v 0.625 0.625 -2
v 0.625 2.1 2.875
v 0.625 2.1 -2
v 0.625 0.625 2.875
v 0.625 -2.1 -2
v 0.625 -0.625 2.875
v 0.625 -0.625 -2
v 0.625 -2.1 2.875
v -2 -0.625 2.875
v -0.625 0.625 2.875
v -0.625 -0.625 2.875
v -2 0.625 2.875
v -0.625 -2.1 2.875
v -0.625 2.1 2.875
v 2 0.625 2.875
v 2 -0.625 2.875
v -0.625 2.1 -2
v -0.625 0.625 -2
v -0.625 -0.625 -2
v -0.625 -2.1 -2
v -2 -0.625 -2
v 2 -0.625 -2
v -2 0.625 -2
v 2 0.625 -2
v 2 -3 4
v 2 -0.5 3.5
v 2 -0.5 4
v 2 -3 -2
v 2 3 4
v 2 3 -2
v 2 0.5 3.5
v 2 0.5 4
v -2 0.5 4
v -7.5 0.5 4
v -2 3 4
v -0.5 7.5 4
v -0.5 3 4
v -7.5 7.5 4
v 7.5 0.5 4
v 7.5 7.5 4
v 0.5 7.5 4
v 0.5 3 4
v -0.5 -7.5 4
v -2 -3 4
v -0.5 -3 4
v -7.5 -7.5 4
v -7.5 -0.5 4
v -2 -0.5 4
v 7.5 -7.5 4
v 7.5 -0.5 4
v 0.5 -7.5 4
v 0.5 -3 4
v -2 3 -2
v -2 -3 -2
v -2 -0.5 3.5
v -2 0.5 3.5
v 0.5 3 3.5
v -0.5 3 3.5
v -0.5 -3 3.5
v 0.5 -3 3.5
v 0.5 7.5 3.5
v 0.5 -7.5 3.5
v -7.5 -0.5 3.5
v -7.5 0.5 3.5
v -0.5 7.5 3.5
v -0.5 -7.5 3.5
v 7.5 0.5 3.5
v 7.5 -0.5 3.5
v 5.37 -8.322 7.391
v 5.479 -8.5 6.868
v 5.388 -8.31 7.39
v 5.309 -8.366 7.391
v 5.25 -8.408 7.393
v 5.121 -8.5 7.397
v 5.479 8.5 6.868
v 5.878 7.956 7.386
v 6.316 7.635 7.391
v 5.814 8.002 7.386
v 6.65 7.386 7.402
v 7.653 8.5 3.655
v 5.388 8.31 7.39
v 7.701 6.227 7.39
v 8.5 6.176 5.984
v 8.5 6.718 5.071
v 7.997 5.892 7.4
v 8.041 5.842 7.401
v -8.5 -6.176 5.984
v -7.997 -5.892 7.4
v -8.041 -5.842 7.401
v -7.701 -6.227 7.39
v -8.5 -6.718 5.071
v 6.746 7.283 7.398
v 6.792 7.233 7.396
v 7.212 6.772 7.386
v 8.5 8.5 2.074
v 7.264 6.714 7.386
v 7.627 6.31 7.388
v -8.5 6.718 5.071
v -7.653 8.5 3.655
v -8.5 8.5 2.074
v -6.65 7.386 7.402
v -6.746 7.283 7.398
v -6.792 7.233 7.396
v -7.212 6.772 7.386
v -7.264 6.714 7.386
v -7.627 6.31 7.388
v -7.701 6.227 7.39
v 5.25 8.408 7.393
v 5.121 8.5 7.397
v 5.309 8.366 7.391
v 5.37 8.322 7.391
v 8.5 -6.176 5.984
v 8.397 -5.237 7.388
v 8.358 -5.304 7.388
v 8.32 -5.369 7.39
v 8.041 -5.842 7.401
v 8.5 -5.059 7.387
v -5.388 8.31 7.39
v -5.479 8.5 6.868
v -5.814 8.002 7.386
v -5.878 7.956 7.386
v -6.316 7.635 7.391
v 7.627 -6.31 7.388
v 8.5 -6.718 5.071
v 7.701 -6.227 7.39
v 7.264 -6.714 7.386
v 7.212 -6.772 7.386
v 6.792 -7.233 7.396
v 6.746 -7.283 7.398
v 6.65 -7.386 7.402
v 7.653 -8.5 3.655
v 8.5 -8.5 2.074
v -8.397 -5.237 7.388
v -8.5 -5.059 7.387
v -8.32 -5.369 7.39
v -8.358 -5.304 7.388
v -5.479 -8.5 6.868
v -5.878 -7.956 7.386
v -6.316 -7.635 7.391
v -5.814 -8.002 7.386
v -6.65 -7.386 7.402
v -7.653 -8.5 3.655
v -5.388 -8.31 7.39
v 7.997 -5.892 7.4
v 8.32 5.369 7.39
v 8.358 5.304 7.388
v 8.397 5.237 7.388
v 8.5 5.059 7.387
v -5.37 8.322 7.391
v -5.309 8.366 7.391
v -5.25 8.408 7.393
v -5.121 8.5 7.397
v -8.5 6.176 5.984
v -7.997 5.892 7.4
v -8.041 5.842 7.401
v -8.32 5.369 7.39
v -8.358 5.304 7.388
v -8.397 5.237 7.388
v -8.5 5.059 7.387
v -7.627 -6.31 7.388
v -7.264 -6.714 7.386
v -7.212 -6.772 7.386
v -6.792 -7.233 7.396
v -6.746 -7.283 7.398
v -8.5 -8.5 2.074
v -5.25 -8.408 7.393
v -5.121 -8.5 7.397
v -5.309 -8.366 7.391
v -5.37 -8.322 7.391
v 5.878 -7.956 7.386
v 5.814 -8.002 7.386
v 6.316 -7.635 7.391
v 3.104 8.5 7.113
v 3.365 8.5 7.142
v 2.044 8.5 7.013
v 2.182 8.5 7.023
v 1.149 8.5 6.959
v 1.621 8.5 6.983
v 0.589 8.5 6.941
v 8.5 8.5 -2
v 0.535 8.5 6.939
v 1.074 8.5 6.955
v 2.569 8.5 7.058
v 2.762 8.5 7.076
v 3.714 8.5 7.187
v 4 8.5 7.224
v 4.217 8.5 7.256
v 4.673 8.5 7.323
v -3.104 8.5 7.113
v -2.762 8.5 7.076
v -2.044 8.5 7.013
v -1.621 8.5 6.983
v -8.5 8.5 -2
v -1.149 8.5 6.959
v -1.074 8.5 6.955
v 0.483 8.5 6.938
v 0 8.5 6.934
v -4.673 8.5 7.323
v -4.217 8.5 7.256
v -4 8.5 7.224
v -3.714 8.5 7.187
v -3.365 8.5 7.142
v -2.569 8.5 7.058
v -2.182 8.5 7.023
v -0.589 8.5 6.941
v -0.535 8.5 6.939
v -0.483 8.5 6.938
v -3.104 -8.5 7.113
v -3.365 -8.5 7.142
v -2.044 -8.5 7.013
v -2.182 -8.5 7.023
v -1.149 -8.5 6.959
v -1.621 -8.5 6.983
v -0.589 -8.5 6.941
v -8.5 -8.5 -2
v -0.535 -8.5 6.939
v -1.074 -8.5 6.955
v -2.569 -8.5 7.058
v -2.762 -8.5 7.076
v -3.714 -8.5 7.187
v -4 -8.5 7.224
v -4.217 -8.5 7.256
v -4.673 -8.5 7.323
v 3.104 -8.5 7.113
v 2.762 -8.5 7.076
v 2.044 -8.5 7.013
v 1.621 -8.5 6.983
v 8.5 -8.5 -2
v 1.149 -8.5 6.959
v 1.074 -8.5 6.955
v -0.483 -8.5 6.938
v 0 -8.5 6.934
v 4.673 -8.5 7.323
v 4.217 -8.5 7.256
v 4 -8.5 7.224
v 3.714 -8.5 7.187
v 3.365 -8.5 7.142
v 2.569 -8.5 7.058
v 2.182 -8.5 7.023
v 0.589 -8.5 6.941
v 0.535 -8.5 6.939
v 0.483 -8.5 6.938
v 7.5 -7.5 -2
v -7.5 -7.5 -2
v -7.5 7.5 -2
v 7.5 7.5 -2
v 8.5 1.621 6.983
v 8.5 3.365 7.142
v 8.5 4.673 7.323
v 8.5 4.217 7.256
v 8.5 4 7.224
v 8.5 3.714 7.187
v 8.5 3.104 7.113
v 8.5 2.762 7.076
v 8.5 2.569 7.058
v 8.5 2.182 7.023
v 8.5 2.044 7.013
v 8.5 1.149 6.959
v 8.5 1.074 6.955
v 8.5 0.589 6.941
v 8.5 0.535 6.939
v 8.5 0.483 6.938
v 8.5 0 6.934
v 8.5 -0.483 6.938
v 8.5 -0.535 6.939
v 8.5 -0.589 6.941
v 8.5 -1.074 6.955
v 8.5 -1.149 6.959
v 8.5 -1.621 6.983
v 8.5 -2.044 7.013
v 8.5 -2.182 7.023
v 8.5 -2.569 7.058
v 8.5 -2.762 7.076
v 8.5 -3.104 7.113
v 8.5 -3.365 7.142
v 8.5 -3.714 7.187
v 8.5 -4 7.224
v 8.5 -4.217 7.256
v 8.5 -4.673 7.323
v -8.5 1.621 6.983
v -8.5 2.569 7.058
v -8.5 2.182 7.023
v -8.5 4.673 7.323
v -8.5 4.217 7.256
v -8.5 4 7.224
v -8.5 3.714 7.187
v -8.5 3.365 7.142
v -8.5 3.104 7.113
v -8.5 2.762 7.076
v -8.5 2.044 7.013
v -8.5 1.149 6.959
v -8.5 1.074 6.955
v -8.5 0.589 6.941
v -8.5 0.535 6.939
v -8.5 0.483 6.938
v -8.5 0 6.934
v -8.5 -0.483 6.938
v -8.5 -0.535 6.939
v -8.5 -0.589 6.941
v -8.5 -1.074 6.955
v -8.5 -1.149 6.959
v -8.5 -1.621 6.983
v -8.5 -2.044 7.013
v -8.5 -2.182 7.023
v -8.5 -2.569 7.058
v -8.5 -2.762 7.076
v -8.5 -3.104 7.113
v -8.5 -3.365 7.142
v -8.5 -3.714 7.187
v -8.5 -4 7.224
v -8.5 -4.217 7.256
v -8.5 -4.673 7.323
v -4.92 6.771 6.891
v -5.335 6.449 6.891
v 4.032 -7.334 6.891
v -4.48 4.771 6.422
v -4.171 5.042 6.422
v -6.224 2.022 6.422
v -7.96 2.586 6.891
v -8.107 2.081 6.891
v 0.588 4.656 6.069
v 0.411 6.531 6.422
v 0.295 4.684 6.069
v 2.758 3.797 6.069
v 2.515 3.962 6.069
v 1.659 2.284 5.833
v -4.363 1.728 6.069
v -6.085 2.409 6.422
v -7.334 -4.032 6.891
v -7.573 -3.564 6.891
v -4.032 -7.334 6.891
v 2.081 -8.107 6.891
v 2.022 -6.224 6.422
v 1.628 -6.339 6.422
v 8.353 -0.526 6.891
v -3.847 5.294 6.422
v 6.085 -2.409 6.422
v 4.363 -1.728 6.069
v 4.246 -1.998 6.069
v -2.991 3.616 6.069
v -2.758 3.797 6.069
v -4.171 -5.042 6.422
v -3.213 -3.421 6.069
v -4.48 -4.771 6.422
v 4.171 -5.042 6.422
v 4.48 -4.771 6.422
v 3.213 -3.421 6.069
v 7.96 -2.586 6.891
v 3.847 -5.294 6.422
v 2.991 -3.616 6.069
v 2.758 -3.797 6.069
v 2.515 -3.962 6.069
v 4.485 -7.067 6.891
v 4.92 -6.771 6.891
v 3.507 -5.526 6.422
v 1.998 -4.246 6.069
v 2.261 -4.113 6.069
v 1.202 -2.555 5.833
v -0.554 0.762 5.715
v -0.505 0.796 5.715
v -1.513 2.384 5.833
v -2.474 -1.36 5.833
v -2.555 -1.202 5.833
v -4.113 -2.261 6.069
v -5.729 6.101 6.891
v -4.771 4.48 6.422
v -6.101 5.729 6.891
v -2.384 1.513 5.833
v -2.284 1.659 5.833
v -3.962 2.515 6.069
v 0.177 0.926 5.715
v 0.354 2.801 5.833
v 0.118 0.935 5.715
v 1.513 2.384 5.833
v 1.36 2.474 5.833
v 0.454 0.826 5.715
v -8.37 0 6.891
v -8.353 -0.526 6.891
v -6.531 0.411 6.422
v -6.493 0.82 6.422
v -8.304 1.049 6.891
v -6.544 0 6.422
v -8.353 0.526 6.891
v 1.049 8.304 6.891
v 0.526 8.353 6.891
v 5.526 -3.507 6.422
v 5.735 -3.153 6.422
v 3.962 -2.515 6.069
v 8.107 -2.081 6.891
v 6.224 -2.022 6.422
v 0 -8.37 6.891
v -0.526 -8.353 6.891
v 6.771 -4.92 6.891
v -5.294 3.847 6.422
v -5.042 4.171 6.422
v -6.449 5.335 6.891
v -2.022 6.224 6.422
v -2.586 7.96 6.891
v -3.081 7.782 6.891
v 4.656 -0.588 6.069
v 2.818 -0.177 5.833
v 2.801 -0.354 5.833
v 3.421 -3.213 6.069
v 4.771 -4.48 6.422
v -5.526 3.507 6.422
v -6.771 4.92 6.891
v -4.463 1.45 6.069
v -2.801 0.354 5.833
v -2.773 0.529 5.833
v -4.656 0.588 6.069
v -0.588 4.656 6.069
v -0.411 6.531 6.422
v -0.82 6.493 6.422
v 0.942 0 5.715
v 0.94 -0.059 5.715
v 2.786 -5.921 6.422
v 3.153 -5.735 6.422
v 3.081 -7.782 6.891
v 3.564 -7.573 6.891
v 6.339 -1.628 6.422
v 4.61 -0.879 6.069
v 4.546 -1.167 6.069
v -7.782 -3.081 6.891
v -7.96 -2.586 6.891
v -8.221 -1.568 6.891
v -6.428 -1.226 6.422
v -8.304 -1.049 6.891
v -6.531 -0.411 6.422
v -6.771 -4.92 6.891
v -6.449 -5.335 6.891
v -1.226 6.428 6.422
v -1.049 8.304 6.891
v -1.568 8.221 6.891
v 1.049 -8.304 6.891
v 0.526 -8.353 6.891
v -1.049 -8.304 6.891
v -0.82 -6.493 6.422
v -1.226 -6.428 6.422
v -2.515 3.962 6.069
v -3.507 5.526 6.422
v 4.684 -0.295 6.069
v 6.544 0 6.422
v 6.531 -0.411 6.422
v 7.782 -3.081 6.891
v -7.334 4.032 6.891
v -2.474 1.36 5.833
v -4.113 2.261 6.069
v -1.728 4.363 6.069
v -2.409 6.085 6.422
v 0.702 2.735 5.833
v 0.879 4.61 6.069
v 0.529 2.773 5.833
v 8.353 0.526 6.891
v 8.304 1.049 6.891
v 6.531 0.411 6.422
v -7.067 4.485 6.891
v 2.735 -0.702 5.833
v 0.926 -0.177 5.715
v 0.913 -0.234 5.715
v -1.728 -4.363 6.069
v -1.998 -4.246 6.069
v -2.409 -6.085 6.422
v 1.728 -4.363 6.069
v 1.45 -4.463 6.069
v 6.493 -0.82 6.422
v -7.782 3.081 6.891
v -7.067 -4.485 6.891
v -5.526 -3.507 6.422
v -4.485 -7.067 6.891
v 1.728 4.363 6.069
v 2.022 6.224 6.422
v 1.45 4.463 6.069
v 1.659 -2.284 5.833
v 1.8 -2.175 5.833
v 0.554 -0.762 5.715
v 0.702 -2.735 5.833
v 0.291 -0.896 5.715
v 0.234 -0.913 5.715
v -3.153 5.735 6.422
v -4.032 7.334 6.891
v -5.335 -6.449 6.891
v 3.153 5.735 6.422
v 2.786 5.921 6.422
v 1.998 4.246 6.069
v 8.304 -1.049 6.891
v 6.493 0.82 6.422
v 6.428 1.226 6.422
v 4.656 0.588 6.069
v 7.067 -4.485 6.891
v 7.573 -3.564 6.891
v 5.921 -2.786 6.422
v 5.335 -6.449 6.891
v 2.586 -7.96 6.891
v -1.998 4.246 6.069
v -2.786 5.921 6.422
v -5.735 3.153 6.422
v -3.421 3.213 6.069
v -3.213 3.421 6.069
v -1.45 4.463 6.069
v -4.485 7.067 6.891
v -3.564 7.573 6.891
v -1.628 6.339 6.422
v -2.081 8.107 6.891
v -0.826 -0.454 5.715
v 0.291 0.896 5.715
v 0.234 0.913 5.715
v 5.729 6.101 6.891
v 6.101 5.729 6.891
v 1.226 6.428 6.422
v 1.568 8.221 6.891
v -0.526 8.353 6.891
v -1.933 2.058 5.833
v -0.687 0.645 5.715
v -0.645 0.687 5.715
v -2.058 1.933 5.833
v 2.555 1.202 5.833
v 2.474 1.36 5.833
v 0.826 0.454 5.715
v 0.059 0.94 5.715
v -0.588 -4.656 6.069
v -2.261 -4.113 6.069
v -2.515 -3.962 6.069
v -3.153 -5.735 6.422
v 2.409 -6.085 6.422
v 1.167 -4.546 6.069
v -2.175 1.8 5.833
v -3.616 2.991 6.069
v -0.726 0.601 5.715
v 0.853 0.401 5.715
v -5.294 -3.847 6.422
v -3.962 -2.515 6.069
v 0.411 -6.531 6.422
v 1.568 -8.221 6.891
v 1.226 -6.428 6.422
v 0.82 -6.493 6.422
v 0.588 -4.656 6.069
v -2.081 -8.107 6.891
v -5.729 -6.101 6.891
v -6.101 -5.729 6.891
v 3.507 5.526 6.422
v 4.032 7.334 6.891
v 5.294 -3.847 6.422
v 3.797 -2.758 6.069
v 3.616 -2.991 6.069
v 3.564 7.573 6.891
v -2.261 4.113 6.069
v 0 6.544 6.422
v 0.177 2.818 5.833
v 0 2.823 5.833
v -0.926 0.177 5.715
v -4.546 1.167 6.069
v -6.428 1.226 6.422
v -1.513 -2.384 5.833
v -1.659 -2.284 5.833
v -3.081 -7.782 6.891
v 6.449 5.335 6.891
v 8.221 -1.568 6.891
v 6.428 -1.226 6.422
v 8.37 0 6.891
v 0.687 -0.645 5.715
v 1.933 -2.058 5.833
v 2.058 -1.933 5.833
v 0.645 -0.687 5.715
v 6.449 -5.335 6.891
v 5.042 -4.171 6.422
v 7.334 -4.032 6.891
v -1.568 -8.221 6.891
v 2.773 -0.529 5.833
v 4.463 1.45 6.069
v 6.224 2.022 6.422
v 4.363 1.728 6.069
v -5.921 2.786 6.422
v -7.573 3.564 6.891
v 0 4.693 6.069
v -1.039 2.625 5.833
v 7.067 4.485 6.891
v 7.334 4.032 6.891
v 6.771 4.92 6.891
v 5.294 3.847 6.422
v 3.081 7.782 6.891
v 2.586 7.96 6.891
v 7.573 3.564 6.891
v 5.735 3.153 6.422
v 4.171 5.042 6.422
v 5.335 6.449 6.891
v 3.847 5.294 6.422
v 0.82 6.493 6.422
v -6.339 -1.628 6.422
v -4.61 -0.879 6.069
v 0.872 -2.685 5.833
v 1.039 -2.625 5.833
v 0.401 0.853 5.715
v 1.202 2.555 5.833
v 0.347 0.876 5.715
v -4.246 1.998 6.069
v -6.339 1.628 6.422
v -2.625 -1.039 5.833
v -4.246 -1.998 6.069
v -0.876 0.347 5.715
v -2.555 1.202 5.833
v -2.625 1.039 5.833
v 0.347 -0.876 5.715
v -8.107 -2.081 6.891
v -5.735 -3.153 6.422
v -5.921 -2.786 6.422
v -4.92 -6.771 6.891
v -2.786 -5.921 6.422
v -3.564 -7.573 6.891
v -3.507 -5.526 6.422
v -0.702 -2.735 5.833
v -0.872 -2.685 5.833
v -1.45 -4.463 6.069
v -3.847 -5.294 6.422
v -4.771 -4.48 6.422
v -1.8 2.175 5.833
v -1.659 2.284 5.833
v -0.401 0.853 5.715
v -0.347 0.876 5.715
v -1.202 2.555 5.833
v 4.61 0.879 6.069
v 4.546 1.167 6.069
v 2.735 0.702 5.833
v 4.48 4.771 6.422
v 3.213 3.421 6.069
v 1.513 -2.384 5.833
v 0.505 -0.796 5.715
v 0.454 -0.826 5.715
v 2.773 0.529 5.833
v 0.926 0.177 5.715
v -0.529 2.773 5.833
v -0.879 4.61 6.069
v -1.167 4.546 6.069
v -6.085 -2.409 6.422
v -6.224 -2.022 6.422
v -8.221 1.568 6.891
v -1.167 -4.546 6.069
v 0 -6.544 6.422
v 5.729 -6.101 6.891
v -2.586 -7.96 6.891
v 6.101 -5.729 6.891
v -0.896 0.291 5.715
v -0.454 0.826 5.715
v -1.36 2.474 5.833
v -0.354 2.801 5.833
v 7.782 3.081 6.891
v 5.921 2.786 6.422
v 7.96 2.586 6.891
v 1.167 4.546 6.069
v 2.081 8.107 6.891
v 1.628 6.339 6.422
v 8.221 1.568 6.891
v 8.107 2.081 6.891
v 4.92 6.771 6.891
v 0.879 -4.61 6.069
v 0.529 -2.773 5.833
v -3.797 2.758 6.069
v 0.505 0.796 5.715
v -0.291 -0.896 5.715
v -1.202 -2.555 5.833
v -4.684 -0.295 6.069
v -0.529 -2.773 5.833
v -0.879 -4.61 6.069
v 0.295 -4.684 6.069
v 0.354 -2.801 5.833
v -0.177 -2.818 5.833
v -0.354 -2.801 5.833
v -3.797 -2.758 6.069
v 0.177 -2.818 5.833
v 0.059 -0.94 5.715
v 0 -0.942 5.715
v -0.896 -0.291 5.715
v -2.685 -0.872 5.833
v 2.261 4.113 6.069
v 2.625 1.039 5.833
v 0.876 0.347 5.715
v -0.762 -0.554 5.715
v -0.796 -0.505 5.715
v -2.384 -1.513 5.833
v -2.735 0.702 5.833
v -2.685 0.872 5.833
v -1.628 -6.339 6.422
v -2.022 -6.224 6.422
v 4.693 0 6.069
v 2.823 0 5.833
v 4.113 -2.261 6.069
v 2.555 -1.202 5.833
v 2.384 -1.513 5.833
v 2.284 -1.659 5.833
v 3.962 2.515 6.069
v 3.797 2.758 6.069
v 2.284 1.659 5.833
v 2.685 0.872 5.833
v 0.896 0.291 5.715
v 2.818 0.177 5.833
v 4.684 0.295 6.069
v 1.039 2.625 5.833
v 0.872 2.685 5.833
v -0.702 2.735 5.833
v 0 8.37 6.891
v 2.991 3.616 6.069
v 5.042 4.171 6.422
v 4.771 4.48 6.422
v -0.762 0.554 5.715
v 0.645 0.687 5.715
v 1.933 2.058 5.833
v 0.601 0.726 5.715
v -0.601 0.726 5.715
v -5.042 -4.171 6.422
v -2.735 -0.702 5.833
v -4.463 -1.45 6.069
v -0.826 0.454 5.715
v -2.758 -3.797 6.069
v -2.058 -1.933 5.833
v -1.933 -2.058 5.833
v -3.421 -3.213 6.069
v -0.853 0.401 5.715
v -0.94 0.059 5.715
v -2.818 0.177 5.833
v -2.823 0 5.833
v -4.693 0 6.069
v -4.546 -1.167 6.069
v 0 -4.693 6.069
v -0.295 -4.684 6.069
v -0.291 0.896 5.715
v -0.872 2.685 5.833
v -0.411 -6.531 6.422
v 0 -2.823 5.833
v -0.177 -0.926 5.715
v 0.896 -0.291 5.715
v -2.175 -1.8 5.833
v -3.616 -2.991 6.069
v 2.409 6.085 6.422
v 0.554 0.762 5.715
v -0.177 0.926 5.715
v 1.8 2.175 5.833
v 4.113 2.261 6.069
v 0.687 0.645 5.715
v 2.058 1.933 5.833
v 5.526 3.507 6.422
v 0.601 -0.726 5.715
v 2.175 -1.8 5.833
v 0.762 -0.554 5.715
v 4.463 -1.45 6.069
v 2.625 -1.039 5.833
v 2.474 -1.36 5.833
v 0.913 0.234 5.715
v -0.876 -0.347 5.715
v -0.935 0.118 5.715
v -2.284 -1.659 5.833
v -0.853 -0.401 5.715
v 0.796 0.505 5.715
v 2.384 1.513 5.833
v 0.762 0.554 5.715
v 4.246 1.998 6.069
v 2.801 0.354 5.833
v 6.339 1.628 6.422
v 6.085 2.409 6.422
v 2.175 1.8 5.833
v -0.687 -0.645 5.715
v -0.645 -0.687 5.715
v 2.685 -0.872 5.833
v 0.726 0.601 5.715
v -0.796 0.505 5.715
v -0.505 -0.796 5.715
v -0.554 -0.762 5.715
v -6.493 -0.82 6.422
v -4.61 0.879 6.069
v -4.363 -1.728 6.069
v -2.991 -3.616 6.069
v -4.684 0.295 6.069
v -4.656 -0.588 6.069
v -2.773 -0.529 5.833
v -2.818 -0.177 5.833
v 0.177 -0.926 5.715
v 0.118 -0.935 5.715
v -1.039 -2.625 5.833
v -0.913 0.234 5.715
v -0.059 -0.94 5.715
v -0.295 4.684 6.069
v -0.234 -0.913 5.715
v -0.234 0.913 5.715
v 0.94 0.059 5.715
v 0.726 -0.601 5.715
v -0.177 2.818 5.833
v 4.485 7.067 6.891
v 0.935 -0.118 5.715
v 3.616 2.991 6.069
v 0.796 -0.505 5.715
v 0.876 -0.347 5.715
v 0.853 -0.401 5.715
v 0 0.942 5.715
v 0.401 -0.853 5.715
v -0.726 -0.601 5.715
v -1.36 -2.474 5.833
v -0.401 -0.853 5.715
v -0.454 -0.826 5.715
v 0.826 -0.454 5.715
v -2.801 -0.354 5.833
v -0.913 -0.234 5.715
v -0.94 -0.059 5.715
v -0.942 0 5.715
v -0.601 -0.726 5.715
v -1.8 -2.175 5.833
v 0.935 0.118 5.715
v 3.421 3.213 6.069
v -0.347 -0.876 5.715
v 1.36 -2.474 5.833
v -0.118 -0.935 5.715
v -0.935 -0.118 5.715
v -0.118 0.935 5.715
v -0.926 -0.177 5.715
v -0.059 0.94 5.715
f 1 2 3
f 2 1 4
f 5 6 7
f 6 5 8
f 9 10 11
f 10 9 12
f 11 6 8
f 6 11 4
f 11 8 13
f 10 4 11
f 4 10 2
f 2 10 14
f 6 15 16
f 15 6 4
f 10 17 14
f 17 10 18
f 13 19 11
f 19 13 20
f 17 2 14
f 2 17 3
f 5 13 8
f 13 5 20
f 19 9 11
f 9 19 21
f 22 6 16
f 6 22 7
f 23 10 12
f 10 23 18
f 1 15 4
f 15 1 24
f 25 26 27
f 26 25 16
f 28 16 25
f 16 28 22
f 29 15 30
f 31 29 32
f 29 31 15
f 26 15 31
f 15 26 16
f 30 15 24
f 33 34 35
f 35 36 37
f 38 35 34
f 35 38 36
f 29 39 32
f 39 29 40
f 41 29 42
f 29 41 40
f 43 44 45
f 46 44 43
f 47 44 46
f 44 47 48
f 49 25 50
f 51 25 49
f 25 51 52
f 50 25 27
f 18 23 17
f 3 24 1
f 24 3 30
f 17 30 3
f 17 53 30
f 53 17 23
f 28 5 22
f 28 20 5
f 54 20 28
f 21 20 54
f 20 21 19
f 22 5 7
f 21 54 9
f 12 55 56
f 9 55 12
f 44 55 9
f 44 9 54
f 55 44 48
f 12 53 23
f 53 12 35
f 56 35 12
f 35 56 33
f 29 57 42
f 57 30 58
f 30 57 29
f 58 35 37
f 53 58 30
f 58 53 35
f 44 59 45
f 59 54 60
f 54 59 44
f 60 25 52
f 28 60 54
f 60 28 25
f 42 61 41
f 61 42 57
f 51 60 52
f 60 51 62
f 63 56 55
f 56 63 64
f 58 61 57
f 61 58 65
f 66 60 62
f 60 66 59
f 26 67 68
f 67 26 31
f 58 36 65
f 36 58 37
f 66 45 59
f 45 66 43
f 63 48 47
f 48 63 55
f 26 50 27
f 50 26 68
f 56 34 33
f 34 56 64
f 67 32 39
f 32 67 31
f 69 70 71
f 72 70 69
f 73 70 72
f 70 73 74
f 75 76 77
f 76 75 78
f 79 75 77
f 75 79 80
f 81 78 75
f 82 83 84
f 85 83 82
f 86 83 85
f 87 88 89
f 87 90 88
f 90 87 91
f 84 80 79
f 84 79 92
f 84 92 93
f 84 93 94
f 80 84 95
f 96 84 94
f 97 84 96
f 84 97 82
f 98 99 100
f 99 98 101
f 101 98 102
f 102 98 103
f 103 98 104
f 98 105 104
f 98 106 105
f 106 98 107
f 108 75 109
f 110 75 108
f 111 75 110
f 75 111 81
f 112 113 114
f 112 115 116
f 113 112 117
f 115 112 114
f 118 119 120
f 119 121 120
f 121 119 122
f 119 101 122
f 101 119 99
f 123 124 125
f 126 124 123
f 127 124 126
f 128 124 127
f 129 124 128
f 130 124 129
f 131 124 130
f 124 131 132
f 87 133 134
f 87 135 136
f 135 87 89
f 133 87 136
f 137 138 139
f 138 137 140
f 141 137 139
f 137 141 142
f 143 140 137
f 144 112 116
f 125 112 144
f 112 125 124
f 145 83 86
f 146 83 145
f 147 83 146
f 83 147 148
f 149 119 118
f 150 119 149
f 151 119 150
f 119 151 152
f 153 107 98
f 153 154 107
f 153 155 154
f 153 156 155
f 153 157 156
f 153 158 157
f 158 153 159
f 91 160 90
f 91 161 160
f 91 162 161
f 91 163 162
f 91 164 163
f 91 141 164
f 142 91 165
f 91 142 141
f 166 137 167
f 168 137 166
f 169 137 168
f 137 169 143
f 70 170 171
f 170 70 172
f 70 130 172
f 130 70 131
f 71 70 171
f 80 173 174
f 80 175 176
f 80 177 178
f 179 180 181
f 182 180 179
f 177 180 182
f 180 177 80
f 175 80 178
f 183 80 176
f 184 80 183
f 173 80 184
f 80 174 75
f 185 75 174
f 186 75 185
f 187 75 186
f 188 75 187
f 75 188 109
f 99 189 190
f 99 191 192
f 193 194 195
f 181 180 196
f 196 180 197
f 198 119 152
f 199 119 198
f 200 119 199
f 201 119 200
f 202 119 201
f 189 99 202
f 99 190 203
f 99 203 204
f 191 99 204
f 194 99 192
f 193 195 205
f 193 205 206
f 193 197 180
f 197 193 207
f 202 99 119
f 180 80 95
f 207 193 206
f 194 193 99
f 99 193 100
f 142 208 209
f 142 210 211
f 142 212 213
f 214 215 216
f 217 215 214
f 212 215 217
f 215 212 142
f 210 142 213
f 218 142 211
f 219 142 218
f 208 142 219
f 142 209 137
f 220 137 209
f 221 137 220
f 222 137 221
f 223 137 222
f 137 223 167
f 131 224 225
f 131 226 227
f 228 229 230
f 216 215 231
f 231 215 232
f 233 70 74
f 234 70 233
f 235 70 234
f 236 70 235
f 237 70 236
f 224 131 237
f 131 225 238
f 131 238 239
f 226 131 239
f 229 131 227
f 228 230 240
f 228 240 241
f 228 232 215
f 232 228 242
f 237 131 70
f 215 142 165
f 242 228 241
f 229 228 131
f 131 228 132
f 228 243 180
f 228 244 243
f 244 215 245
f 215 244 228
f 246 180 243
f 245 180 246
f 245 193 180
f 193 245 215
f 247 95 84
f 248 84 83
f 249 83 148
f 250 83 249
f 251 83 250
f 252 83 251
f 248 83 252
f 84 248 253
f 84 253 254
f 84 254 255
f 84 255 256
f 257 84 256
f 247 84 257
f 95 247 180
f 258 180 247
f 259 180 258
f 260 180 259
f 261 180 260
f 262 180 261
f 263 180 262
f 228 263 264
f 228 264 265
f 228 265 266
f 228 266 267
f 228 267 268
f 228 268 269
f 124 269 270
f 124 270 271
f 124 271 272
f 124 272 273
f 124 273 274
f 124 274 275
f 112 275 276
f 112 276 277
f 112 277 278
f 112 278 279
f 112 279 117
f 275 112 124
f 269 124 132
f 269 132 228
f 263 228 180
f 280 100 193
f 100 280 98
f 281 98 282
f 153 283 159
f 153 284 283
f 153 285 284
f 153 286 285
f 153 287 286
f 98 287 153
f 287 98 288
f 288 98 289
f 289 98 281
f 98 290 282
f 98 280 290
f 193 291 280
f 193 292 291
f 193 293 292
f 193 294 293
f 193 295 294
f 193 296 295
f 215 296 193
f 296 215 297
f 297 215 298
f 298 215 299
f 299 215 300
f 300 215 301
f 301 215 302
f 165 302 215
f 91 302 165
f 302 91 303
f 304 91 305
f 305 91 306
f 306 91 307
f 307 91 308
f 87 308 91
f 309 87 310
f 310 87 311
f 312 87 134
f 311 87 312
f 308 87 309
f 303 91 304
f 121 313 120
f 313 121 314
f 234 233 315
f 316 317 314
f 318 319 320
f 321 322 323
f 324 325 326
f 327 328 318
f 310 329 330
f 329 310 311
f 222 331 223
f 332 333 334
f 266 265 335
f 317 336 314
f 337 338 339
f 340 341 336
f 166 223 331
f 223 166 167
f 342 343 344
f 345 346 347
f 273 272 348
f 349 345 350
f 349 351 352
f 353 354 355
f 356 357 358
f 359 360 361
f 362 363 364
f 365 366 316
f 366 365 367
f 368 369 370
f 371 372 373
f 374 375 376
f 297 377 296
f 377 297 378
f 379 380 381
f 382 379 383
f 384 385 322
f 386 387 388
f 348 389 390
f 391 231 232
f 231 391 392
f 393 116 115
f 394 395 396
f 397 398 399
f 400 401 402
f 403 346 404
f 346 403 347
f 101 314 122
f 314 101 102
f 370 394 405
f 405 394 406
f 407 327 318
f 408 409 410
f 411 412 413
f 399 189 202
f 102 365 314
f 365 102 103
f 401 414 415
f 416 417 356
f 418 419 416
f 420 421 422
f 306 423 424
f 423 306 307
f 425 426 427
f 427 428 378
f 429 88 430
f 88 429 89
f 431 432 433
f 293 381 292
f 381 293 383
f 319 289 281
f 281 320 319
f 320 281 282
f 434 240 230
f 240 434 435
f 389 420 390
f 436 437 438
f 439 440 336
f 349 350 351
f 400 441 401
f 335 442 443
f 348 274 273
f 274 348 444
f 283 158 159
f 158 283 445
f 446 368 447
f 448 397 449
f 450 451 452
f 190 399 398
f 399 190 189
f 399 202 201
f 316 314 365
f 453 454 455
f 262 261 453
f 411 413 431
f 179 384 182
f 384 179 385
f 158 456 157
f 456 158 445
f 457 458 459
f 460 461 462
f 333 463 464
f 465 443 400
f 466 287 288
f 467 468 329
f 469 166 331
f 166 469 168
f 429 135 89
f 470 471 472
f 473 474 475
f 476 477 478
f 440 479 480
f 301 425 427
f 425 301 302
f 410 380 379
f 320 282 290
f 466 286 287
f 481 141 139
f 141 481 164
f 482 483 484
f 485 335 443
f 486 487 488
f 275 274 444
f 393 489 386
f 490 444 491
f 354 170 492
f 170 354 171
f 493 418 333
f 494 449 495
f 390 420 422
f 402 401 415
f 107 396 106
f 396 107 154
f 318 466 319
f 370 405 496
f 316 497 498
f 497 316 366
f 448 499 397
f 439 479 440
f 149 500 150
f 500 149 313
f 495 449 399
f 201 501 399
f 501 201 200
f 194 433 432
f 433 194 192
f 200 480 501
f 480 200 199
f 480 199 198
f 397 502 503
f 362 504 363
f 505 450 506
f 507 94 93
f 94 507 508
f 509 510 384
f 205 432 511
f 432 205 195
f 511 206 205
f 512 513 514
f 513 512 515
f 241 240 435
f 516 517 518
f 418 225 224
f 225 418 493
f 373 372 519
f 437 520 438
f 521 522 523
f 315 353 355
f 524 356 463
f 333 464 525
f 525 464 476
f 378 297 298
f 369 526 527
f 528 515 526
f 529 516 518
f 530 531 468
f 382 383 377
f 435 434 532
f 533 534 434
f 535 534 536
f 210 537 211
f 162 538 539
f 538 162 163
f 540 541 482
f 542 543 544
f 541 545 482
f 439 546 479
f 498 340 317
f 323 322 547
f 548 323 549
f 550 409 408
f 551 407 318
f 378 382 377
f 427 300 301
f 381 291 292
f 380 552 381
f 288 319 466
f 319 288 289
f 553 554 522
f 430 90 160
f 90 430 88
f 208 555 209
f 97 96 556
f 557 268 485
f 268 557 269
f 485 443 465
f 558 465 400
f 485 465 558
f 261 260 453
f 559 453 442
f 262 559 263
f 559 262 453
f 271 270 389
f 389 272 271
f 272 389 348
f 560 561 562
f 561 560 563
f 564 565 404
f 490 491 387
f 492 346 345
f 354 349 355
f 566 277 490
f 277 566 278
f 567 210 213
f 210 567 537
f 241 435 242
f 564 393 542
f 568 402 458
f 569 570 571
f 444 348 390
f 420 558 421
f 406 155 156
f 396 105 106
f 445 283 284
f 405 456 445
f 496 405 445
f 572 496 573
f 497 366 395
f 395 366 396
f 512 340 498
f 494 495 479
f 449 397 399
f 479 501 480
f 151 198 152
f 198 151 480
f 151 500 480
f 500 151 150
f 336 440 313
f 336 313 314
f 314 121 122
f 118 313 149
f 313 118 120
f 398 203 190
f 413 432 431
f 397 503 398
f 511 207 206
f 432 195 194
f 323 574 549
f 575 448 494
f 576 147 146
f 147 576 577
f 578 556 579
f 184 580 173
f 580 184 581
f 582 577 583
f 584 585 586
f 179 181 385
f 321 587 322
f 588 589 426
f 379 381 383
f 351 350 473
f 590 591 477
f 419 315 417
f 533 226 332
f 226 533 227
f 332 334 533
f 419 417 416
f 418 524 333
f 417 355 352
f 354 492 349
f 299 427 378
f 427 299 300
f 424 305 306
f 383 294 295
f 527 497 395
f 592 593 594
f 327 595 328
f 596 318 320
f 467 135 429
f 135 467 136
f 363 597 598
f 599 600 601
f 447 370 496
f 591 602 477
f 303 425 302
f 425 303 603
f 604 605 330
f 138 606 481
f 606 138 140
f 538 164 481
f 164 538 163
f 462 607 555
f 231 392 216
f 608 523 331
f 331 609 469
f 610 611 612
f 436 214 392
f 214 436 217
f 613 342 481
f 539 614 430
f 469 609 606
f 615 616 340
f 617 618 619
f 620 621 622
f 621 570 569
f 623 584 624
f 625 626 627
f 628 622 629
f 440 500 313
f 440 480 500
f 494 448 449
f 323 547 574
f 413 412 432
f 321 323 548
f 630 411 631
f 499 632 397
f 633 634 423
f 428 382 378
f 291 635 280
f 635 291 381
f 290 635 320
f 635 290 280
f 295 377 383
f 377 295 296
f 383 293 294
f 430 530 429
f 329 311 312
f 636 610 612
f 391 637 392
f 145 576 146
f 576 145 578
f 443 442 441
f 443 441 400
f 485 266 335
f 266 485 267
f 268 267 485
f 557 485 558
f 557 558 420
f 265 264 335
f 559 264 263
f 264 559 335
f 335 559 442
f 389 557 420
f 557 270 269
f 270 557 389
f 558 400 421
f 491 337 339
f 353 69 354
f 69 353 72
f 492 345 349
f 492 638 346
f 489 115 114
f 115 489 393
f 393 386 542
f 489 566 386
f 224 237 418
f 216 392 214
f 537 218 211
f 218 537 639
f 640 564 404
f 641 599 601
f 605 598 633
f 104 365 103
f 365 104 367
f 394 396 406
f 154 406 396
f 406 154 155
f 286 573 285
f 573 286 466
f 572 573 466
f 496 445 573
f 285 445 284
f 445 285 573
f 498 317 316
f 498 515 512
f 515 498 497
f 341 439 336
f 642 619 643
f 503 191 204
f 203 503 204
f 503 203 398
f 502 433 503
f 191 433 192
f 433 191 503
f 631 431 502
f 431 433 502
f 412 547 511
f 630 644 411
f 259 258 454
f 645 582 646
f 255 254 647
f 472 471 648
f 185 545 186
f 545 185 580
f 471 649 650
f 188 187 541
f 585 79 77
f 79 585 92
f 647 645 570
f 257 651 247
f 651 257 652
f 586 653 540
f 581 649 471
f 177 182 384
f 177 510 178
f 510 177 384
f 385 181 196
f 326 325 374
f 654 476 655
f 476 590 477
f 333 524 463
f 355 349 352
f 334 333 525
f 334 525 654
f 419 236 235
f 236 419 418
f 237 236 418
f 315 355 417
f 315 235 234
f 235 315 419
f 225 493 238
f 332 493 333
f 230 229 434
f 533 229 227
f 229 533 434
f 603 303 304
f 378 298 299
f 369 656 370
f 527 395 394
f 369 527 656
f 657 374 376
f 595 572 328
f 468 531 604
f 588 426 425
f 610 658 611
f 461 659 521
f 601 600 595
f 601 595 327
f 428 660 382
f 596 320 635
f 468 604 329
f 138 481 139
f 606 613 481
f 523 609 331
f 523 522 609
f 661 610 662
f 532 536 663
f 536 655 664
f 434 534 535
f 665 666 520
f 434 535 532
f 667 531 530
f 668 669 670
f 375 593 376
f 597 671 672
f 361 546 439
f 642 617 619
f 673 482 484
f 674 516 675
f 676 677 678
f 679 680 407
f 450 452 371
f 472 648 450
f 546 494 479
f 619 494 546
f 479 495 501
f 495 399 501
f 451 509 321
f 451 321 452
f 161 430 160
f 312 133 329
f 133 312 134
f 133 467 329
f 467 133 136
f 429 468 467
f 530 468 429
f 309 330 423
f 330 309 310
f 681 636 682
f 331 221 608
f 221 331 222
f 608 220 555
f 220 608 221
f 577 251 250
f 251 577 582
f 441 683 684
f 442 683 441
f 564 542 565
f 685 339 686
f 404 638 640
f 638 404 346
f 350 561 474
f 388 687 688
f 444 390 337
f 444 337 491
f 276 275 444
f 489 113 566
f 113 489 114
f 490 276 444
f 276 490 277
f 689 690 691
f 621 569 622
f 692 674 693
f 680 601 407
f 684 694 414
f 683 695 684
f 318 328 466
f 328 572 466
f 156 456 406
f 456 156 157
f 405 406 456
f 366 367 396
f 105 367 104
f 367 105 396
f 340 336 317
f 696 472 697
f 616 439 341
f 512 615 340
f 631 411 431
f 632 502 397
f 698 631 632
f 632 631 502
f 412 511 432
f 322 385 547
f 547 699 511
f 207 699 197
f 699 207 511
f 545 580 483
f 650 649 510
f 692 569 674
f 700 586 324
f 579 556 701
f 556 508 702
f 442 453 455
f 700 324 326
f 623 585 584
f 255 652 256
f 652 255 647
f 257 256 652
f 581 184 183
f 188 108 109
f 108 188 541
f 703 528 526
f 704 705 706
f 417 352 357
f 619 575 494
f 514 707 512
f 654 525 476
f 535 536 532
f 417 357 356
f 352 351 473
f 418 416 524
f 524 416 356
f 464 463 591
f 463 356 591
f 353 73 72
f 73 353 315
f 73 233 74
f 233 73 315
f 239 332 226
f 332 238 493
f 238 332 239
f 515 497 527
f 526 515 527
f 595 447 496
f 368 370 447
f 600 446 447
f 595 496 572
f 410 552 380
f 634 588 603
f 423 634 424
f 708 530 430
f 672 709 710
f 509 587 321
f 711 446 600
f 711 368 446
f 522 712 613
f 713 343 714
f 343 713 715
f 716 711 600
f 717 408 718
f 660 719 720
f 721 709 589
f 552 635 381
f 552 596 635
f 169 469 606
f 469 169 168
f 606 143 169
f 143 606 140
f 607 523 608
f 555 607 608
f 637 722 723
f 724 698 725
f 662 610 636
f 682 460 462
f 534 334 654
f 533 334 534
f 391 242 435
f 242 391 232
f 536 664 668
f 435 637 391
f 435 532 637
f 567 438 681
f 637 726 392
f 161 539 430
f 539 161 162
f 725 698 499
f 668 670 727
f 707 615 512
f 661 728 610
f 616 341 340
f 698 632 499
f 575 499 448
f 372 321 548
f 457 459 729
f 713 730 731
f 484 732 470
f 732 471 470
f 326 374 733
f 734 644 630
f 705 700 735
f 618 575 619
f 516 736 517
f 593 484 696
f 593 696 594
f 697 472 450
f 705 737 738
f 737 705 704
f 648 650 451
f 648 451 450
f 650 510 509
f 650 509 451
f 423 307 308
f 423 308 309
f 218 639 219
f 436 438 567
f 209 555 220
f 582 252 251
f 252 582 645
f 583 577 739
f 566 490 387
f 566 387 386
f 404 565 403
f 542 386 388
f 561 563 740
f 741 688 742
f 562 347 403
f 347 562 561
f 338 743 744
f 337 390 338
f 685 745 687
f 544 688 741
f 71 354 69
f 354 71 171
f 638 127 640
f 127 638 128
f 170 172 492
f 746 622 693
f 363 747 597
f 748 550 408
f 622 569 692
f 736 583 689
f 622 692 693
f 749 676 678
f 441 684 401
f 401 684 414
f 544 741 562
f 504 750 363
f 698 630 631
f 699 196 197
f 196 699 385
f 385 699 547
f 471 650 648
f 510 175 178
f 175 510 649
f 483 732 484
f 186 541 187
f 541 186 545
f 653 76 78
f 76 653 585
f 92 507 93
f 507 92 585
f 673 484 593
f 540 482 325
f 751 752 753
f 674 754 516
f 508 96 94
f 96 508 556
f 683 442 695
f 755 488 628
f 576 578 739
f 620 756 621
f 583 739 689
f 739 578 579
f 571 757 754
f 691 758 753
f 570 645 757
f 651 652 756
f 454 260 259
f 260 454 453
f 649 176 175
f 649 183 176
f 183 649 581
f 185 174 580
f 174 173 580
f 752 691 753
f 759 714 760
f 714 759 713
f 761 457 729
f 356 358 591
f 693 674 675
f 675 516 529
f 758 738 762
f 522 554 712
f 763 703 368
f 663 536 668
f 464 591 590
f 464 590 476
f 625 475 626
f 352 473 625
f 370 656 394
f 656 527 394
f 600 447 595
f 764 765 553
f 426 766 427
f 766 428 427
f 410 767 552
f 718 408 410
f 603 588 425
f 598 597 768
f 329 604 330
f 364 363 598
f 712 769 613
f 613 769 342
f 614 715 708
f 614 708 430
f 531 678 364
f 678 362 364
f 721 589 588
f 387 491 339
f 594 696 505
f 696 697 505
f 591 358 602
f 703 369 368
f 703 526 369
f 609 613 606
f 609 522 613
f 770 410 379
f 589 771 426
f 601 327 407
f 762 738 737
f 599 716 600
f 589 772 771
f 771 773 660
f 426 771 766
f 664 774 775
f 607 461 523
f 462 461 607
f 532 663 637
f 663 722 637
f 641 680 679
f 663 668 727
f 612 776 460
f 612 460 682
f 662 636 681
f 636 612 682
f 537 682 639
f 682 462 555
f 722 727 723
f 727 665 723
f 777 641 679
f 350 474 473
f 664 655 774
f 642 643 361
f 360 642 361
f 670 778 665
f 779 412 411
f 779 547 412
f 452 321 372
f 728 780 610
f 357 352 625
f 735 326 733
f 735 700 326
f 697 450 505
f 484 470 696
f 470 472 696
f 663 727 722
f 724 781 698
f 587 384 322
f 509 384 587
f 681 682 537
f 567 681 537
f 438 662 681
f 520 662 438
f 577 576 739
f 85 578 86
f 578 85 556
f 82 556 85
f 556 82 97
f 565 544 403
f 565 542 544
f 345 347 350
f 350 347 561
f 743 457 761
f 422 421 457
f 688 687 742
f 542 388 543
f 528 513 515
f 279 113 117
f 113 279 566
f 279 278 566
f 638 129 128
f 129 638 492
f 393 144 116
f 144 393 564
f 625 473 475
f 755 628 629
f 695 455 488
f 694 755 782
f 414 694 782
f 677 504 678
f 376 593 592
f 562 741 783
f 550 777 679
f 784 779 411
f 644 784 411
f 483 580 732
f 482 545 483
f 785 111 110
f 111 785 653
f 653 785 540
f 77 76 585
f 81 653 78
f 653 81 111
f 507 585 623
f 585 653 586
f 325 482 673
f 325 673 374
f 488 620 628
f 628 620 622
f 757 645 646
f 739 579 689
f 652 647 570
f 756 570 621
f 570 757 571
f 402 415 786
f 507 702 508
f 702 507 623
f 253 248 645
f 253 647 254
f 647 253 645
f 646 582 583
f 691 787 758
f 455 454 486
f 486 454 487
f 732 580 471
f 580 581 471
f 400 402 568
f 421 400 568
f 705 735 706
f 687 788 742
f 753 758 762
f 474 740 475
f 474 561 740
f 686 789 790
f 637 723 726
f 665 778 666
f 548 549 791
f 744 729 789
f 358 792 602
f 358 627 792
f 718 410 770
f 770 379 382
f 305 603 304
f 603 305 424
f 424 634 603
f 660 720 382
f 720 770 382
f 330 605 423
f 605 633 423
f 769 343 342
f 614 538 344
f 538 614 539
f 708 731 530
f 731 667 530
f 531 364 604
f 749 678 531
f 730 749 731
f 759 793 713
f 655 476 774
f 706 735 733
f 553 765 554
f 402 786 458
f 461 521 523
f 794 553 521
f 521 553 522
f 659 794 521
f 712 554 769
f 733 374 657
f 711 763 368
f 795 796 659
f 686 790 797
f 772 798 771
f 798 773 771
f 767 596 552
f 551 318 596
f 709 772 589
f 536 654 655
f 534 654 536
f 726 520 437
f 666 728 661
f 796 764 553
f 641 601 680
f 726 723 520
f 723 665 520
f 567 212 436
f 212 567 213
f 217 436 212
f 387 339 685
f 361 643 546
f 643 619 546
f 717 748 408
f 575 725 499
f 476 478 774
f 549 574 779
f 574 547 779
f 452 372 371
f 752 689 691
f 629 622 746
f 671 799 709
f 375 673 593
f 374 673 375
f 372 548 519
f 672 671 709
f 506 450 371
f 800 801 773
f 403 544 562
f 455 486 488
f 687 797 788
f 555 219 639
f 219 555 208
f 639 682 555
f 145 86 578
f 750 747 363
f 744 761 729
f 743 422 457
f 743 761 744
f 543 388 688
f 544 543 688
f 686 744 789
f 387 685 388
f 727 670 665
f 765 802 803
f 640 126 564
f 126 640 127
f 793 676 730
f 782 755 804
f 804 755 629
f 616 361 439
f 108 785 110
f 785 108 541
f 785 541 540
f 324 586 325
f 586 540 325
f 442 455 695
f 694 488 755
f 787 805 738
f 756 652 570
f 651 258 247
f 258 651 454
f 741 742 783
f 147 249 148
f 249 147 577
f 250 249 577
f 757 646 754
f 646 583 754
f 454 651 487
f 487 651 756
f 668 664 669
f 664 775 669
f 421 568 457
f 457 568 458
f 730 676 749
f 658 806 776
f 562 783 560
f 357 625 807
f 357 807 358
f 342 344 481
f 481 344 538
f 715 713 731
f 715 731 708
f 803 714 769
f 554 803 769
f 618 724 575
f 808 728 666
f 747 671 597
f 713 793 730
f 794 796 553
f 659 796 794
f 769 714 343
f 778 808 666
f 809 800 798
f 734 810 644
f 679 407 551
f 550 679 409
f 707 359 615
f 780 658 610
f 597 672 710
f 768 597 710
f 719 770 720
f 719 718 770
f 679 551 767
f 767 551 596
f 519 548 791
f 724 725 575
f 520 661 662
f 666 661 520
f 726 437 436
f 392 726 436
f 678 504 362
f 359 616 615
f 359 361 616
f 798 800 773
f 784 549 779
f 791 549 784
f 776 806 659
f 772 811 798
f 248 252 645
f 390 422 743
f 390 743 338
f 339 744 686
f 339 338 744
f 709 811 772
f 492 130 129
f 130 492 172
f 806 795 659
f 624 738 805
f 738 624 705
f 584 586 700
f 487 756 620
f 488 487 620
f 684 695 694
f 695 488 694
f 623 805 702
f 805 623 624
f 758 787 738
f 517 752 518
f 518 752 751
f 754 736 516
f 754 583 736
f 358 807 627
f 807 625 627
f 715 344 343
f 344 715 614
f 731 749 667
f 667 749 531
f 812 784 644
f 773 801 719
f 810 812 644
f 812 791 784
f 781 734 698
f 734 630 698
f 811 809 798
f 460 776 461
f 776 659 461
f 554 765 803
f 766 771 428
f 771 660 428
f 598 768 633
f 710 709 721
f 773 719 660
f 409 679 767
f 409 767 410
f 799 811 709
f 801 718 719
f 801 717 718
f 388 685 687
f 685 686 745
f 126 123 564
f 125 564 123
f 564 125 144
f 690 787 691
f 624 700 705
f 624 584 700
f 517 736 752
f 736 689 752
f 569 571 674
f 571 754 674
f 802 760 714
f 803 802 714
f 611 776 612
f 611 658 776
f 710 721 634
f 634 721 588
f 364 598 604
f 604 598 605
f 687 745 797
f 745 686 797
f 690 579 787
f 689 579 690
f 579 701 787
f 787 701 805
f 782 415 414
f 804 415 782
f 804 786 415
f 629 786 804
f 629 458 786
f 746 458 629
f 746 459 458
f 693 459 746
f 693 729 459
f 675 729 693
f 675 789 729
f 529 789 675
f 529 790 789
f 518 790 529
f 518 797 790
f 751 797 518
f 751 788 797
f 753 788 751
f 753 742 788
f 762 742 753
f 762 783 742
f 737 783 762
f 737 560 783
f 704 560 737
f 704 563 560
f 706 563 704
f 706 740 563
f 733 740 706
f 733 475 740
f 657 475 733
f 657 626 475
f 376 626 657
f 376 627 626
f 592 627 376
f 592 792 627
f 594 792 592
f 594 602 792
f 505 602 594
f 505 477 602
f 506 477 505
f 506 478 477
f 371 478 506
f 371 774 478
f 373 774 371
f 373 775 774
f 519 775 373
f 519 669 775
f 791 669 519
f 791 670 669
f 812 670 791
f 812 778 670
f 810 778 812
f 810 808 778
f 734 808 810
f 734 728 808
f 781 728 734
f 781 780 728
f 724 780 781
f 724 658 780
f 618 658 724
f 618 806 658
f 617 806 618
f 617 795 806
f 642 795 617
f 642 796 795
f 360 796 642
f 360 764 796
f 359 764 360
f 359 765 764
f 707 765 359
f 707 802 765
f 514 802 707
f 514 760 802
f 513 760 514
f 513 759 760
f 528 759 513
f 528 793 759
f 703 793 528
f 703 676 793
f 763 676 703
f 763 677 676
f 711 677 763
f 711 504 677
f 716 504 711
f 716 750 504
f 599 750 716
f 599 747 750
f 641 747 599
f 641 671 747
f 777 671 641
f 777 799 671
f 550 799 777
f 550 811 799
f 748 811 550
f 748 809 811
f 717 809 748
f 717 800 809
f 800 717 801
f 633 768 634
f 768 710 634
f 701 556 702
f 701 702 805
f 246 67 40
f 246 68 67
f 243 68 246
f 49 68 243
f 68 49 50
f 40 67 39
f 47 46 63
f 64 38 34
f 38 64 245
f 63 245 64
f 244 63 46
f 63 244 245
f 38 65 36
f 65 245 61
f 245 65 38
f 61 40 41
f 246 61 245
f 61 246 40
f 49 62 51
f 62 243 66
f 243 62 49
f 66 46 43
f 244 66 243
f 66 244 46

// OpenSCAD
module stem() {
	cube([1.25,4.2,6], center=true);
	rotate([0,0,90]) {
		cube([1.25,4.2,6], center=true);
	}
}


module stem_block() {
	difference() {
		translate([0,0,1]) {
			union() {
				cube([4,6,6],center=true);
				translate([0,0,-3]) {
					//cylinder(h=6, r=2.25, $fn=25);
				}
			}

		}
		translate([0,0,-0.125]) {
		 	stem();
		}
	}
}


module stem_supports() {
	translate([0,0,4]) {
		cube([1,16,1], center=true);
	}
	rotate([0,0,90]) {
	translate([0,0,4]) {
		cube([1,16,1], center=true);
	}
	}
}


module key_shell() {
	difference() {
		intersection() {
			translate([0,0,3]) {
				cylinder(r1=16.5, r2=4.5, h=30, center=true);
			}


			hull() {
				translate([6,6,4]) {sphere(r=2.5);}
	
				translate([6,-6,4]) {sphere(r=2.5);}
				translate([-6,6,4]) {sphere(r=2.5);}
				translate([-6,-6,4]) {sphere(r=2.5);}
	
				cube([17,17,10], center=true);
			}
		}
		translate([0,0,32.7]) {
		sphere(r=30, center=true, $fn=100);

	}

		translate([0,0,-2]) {

			cube([15,15,6], center=true);
		}

	}
}

union() {
	stem_block();
	stem_supports();



	translate([0,0,3]) {
		key_shell();
	}
}
